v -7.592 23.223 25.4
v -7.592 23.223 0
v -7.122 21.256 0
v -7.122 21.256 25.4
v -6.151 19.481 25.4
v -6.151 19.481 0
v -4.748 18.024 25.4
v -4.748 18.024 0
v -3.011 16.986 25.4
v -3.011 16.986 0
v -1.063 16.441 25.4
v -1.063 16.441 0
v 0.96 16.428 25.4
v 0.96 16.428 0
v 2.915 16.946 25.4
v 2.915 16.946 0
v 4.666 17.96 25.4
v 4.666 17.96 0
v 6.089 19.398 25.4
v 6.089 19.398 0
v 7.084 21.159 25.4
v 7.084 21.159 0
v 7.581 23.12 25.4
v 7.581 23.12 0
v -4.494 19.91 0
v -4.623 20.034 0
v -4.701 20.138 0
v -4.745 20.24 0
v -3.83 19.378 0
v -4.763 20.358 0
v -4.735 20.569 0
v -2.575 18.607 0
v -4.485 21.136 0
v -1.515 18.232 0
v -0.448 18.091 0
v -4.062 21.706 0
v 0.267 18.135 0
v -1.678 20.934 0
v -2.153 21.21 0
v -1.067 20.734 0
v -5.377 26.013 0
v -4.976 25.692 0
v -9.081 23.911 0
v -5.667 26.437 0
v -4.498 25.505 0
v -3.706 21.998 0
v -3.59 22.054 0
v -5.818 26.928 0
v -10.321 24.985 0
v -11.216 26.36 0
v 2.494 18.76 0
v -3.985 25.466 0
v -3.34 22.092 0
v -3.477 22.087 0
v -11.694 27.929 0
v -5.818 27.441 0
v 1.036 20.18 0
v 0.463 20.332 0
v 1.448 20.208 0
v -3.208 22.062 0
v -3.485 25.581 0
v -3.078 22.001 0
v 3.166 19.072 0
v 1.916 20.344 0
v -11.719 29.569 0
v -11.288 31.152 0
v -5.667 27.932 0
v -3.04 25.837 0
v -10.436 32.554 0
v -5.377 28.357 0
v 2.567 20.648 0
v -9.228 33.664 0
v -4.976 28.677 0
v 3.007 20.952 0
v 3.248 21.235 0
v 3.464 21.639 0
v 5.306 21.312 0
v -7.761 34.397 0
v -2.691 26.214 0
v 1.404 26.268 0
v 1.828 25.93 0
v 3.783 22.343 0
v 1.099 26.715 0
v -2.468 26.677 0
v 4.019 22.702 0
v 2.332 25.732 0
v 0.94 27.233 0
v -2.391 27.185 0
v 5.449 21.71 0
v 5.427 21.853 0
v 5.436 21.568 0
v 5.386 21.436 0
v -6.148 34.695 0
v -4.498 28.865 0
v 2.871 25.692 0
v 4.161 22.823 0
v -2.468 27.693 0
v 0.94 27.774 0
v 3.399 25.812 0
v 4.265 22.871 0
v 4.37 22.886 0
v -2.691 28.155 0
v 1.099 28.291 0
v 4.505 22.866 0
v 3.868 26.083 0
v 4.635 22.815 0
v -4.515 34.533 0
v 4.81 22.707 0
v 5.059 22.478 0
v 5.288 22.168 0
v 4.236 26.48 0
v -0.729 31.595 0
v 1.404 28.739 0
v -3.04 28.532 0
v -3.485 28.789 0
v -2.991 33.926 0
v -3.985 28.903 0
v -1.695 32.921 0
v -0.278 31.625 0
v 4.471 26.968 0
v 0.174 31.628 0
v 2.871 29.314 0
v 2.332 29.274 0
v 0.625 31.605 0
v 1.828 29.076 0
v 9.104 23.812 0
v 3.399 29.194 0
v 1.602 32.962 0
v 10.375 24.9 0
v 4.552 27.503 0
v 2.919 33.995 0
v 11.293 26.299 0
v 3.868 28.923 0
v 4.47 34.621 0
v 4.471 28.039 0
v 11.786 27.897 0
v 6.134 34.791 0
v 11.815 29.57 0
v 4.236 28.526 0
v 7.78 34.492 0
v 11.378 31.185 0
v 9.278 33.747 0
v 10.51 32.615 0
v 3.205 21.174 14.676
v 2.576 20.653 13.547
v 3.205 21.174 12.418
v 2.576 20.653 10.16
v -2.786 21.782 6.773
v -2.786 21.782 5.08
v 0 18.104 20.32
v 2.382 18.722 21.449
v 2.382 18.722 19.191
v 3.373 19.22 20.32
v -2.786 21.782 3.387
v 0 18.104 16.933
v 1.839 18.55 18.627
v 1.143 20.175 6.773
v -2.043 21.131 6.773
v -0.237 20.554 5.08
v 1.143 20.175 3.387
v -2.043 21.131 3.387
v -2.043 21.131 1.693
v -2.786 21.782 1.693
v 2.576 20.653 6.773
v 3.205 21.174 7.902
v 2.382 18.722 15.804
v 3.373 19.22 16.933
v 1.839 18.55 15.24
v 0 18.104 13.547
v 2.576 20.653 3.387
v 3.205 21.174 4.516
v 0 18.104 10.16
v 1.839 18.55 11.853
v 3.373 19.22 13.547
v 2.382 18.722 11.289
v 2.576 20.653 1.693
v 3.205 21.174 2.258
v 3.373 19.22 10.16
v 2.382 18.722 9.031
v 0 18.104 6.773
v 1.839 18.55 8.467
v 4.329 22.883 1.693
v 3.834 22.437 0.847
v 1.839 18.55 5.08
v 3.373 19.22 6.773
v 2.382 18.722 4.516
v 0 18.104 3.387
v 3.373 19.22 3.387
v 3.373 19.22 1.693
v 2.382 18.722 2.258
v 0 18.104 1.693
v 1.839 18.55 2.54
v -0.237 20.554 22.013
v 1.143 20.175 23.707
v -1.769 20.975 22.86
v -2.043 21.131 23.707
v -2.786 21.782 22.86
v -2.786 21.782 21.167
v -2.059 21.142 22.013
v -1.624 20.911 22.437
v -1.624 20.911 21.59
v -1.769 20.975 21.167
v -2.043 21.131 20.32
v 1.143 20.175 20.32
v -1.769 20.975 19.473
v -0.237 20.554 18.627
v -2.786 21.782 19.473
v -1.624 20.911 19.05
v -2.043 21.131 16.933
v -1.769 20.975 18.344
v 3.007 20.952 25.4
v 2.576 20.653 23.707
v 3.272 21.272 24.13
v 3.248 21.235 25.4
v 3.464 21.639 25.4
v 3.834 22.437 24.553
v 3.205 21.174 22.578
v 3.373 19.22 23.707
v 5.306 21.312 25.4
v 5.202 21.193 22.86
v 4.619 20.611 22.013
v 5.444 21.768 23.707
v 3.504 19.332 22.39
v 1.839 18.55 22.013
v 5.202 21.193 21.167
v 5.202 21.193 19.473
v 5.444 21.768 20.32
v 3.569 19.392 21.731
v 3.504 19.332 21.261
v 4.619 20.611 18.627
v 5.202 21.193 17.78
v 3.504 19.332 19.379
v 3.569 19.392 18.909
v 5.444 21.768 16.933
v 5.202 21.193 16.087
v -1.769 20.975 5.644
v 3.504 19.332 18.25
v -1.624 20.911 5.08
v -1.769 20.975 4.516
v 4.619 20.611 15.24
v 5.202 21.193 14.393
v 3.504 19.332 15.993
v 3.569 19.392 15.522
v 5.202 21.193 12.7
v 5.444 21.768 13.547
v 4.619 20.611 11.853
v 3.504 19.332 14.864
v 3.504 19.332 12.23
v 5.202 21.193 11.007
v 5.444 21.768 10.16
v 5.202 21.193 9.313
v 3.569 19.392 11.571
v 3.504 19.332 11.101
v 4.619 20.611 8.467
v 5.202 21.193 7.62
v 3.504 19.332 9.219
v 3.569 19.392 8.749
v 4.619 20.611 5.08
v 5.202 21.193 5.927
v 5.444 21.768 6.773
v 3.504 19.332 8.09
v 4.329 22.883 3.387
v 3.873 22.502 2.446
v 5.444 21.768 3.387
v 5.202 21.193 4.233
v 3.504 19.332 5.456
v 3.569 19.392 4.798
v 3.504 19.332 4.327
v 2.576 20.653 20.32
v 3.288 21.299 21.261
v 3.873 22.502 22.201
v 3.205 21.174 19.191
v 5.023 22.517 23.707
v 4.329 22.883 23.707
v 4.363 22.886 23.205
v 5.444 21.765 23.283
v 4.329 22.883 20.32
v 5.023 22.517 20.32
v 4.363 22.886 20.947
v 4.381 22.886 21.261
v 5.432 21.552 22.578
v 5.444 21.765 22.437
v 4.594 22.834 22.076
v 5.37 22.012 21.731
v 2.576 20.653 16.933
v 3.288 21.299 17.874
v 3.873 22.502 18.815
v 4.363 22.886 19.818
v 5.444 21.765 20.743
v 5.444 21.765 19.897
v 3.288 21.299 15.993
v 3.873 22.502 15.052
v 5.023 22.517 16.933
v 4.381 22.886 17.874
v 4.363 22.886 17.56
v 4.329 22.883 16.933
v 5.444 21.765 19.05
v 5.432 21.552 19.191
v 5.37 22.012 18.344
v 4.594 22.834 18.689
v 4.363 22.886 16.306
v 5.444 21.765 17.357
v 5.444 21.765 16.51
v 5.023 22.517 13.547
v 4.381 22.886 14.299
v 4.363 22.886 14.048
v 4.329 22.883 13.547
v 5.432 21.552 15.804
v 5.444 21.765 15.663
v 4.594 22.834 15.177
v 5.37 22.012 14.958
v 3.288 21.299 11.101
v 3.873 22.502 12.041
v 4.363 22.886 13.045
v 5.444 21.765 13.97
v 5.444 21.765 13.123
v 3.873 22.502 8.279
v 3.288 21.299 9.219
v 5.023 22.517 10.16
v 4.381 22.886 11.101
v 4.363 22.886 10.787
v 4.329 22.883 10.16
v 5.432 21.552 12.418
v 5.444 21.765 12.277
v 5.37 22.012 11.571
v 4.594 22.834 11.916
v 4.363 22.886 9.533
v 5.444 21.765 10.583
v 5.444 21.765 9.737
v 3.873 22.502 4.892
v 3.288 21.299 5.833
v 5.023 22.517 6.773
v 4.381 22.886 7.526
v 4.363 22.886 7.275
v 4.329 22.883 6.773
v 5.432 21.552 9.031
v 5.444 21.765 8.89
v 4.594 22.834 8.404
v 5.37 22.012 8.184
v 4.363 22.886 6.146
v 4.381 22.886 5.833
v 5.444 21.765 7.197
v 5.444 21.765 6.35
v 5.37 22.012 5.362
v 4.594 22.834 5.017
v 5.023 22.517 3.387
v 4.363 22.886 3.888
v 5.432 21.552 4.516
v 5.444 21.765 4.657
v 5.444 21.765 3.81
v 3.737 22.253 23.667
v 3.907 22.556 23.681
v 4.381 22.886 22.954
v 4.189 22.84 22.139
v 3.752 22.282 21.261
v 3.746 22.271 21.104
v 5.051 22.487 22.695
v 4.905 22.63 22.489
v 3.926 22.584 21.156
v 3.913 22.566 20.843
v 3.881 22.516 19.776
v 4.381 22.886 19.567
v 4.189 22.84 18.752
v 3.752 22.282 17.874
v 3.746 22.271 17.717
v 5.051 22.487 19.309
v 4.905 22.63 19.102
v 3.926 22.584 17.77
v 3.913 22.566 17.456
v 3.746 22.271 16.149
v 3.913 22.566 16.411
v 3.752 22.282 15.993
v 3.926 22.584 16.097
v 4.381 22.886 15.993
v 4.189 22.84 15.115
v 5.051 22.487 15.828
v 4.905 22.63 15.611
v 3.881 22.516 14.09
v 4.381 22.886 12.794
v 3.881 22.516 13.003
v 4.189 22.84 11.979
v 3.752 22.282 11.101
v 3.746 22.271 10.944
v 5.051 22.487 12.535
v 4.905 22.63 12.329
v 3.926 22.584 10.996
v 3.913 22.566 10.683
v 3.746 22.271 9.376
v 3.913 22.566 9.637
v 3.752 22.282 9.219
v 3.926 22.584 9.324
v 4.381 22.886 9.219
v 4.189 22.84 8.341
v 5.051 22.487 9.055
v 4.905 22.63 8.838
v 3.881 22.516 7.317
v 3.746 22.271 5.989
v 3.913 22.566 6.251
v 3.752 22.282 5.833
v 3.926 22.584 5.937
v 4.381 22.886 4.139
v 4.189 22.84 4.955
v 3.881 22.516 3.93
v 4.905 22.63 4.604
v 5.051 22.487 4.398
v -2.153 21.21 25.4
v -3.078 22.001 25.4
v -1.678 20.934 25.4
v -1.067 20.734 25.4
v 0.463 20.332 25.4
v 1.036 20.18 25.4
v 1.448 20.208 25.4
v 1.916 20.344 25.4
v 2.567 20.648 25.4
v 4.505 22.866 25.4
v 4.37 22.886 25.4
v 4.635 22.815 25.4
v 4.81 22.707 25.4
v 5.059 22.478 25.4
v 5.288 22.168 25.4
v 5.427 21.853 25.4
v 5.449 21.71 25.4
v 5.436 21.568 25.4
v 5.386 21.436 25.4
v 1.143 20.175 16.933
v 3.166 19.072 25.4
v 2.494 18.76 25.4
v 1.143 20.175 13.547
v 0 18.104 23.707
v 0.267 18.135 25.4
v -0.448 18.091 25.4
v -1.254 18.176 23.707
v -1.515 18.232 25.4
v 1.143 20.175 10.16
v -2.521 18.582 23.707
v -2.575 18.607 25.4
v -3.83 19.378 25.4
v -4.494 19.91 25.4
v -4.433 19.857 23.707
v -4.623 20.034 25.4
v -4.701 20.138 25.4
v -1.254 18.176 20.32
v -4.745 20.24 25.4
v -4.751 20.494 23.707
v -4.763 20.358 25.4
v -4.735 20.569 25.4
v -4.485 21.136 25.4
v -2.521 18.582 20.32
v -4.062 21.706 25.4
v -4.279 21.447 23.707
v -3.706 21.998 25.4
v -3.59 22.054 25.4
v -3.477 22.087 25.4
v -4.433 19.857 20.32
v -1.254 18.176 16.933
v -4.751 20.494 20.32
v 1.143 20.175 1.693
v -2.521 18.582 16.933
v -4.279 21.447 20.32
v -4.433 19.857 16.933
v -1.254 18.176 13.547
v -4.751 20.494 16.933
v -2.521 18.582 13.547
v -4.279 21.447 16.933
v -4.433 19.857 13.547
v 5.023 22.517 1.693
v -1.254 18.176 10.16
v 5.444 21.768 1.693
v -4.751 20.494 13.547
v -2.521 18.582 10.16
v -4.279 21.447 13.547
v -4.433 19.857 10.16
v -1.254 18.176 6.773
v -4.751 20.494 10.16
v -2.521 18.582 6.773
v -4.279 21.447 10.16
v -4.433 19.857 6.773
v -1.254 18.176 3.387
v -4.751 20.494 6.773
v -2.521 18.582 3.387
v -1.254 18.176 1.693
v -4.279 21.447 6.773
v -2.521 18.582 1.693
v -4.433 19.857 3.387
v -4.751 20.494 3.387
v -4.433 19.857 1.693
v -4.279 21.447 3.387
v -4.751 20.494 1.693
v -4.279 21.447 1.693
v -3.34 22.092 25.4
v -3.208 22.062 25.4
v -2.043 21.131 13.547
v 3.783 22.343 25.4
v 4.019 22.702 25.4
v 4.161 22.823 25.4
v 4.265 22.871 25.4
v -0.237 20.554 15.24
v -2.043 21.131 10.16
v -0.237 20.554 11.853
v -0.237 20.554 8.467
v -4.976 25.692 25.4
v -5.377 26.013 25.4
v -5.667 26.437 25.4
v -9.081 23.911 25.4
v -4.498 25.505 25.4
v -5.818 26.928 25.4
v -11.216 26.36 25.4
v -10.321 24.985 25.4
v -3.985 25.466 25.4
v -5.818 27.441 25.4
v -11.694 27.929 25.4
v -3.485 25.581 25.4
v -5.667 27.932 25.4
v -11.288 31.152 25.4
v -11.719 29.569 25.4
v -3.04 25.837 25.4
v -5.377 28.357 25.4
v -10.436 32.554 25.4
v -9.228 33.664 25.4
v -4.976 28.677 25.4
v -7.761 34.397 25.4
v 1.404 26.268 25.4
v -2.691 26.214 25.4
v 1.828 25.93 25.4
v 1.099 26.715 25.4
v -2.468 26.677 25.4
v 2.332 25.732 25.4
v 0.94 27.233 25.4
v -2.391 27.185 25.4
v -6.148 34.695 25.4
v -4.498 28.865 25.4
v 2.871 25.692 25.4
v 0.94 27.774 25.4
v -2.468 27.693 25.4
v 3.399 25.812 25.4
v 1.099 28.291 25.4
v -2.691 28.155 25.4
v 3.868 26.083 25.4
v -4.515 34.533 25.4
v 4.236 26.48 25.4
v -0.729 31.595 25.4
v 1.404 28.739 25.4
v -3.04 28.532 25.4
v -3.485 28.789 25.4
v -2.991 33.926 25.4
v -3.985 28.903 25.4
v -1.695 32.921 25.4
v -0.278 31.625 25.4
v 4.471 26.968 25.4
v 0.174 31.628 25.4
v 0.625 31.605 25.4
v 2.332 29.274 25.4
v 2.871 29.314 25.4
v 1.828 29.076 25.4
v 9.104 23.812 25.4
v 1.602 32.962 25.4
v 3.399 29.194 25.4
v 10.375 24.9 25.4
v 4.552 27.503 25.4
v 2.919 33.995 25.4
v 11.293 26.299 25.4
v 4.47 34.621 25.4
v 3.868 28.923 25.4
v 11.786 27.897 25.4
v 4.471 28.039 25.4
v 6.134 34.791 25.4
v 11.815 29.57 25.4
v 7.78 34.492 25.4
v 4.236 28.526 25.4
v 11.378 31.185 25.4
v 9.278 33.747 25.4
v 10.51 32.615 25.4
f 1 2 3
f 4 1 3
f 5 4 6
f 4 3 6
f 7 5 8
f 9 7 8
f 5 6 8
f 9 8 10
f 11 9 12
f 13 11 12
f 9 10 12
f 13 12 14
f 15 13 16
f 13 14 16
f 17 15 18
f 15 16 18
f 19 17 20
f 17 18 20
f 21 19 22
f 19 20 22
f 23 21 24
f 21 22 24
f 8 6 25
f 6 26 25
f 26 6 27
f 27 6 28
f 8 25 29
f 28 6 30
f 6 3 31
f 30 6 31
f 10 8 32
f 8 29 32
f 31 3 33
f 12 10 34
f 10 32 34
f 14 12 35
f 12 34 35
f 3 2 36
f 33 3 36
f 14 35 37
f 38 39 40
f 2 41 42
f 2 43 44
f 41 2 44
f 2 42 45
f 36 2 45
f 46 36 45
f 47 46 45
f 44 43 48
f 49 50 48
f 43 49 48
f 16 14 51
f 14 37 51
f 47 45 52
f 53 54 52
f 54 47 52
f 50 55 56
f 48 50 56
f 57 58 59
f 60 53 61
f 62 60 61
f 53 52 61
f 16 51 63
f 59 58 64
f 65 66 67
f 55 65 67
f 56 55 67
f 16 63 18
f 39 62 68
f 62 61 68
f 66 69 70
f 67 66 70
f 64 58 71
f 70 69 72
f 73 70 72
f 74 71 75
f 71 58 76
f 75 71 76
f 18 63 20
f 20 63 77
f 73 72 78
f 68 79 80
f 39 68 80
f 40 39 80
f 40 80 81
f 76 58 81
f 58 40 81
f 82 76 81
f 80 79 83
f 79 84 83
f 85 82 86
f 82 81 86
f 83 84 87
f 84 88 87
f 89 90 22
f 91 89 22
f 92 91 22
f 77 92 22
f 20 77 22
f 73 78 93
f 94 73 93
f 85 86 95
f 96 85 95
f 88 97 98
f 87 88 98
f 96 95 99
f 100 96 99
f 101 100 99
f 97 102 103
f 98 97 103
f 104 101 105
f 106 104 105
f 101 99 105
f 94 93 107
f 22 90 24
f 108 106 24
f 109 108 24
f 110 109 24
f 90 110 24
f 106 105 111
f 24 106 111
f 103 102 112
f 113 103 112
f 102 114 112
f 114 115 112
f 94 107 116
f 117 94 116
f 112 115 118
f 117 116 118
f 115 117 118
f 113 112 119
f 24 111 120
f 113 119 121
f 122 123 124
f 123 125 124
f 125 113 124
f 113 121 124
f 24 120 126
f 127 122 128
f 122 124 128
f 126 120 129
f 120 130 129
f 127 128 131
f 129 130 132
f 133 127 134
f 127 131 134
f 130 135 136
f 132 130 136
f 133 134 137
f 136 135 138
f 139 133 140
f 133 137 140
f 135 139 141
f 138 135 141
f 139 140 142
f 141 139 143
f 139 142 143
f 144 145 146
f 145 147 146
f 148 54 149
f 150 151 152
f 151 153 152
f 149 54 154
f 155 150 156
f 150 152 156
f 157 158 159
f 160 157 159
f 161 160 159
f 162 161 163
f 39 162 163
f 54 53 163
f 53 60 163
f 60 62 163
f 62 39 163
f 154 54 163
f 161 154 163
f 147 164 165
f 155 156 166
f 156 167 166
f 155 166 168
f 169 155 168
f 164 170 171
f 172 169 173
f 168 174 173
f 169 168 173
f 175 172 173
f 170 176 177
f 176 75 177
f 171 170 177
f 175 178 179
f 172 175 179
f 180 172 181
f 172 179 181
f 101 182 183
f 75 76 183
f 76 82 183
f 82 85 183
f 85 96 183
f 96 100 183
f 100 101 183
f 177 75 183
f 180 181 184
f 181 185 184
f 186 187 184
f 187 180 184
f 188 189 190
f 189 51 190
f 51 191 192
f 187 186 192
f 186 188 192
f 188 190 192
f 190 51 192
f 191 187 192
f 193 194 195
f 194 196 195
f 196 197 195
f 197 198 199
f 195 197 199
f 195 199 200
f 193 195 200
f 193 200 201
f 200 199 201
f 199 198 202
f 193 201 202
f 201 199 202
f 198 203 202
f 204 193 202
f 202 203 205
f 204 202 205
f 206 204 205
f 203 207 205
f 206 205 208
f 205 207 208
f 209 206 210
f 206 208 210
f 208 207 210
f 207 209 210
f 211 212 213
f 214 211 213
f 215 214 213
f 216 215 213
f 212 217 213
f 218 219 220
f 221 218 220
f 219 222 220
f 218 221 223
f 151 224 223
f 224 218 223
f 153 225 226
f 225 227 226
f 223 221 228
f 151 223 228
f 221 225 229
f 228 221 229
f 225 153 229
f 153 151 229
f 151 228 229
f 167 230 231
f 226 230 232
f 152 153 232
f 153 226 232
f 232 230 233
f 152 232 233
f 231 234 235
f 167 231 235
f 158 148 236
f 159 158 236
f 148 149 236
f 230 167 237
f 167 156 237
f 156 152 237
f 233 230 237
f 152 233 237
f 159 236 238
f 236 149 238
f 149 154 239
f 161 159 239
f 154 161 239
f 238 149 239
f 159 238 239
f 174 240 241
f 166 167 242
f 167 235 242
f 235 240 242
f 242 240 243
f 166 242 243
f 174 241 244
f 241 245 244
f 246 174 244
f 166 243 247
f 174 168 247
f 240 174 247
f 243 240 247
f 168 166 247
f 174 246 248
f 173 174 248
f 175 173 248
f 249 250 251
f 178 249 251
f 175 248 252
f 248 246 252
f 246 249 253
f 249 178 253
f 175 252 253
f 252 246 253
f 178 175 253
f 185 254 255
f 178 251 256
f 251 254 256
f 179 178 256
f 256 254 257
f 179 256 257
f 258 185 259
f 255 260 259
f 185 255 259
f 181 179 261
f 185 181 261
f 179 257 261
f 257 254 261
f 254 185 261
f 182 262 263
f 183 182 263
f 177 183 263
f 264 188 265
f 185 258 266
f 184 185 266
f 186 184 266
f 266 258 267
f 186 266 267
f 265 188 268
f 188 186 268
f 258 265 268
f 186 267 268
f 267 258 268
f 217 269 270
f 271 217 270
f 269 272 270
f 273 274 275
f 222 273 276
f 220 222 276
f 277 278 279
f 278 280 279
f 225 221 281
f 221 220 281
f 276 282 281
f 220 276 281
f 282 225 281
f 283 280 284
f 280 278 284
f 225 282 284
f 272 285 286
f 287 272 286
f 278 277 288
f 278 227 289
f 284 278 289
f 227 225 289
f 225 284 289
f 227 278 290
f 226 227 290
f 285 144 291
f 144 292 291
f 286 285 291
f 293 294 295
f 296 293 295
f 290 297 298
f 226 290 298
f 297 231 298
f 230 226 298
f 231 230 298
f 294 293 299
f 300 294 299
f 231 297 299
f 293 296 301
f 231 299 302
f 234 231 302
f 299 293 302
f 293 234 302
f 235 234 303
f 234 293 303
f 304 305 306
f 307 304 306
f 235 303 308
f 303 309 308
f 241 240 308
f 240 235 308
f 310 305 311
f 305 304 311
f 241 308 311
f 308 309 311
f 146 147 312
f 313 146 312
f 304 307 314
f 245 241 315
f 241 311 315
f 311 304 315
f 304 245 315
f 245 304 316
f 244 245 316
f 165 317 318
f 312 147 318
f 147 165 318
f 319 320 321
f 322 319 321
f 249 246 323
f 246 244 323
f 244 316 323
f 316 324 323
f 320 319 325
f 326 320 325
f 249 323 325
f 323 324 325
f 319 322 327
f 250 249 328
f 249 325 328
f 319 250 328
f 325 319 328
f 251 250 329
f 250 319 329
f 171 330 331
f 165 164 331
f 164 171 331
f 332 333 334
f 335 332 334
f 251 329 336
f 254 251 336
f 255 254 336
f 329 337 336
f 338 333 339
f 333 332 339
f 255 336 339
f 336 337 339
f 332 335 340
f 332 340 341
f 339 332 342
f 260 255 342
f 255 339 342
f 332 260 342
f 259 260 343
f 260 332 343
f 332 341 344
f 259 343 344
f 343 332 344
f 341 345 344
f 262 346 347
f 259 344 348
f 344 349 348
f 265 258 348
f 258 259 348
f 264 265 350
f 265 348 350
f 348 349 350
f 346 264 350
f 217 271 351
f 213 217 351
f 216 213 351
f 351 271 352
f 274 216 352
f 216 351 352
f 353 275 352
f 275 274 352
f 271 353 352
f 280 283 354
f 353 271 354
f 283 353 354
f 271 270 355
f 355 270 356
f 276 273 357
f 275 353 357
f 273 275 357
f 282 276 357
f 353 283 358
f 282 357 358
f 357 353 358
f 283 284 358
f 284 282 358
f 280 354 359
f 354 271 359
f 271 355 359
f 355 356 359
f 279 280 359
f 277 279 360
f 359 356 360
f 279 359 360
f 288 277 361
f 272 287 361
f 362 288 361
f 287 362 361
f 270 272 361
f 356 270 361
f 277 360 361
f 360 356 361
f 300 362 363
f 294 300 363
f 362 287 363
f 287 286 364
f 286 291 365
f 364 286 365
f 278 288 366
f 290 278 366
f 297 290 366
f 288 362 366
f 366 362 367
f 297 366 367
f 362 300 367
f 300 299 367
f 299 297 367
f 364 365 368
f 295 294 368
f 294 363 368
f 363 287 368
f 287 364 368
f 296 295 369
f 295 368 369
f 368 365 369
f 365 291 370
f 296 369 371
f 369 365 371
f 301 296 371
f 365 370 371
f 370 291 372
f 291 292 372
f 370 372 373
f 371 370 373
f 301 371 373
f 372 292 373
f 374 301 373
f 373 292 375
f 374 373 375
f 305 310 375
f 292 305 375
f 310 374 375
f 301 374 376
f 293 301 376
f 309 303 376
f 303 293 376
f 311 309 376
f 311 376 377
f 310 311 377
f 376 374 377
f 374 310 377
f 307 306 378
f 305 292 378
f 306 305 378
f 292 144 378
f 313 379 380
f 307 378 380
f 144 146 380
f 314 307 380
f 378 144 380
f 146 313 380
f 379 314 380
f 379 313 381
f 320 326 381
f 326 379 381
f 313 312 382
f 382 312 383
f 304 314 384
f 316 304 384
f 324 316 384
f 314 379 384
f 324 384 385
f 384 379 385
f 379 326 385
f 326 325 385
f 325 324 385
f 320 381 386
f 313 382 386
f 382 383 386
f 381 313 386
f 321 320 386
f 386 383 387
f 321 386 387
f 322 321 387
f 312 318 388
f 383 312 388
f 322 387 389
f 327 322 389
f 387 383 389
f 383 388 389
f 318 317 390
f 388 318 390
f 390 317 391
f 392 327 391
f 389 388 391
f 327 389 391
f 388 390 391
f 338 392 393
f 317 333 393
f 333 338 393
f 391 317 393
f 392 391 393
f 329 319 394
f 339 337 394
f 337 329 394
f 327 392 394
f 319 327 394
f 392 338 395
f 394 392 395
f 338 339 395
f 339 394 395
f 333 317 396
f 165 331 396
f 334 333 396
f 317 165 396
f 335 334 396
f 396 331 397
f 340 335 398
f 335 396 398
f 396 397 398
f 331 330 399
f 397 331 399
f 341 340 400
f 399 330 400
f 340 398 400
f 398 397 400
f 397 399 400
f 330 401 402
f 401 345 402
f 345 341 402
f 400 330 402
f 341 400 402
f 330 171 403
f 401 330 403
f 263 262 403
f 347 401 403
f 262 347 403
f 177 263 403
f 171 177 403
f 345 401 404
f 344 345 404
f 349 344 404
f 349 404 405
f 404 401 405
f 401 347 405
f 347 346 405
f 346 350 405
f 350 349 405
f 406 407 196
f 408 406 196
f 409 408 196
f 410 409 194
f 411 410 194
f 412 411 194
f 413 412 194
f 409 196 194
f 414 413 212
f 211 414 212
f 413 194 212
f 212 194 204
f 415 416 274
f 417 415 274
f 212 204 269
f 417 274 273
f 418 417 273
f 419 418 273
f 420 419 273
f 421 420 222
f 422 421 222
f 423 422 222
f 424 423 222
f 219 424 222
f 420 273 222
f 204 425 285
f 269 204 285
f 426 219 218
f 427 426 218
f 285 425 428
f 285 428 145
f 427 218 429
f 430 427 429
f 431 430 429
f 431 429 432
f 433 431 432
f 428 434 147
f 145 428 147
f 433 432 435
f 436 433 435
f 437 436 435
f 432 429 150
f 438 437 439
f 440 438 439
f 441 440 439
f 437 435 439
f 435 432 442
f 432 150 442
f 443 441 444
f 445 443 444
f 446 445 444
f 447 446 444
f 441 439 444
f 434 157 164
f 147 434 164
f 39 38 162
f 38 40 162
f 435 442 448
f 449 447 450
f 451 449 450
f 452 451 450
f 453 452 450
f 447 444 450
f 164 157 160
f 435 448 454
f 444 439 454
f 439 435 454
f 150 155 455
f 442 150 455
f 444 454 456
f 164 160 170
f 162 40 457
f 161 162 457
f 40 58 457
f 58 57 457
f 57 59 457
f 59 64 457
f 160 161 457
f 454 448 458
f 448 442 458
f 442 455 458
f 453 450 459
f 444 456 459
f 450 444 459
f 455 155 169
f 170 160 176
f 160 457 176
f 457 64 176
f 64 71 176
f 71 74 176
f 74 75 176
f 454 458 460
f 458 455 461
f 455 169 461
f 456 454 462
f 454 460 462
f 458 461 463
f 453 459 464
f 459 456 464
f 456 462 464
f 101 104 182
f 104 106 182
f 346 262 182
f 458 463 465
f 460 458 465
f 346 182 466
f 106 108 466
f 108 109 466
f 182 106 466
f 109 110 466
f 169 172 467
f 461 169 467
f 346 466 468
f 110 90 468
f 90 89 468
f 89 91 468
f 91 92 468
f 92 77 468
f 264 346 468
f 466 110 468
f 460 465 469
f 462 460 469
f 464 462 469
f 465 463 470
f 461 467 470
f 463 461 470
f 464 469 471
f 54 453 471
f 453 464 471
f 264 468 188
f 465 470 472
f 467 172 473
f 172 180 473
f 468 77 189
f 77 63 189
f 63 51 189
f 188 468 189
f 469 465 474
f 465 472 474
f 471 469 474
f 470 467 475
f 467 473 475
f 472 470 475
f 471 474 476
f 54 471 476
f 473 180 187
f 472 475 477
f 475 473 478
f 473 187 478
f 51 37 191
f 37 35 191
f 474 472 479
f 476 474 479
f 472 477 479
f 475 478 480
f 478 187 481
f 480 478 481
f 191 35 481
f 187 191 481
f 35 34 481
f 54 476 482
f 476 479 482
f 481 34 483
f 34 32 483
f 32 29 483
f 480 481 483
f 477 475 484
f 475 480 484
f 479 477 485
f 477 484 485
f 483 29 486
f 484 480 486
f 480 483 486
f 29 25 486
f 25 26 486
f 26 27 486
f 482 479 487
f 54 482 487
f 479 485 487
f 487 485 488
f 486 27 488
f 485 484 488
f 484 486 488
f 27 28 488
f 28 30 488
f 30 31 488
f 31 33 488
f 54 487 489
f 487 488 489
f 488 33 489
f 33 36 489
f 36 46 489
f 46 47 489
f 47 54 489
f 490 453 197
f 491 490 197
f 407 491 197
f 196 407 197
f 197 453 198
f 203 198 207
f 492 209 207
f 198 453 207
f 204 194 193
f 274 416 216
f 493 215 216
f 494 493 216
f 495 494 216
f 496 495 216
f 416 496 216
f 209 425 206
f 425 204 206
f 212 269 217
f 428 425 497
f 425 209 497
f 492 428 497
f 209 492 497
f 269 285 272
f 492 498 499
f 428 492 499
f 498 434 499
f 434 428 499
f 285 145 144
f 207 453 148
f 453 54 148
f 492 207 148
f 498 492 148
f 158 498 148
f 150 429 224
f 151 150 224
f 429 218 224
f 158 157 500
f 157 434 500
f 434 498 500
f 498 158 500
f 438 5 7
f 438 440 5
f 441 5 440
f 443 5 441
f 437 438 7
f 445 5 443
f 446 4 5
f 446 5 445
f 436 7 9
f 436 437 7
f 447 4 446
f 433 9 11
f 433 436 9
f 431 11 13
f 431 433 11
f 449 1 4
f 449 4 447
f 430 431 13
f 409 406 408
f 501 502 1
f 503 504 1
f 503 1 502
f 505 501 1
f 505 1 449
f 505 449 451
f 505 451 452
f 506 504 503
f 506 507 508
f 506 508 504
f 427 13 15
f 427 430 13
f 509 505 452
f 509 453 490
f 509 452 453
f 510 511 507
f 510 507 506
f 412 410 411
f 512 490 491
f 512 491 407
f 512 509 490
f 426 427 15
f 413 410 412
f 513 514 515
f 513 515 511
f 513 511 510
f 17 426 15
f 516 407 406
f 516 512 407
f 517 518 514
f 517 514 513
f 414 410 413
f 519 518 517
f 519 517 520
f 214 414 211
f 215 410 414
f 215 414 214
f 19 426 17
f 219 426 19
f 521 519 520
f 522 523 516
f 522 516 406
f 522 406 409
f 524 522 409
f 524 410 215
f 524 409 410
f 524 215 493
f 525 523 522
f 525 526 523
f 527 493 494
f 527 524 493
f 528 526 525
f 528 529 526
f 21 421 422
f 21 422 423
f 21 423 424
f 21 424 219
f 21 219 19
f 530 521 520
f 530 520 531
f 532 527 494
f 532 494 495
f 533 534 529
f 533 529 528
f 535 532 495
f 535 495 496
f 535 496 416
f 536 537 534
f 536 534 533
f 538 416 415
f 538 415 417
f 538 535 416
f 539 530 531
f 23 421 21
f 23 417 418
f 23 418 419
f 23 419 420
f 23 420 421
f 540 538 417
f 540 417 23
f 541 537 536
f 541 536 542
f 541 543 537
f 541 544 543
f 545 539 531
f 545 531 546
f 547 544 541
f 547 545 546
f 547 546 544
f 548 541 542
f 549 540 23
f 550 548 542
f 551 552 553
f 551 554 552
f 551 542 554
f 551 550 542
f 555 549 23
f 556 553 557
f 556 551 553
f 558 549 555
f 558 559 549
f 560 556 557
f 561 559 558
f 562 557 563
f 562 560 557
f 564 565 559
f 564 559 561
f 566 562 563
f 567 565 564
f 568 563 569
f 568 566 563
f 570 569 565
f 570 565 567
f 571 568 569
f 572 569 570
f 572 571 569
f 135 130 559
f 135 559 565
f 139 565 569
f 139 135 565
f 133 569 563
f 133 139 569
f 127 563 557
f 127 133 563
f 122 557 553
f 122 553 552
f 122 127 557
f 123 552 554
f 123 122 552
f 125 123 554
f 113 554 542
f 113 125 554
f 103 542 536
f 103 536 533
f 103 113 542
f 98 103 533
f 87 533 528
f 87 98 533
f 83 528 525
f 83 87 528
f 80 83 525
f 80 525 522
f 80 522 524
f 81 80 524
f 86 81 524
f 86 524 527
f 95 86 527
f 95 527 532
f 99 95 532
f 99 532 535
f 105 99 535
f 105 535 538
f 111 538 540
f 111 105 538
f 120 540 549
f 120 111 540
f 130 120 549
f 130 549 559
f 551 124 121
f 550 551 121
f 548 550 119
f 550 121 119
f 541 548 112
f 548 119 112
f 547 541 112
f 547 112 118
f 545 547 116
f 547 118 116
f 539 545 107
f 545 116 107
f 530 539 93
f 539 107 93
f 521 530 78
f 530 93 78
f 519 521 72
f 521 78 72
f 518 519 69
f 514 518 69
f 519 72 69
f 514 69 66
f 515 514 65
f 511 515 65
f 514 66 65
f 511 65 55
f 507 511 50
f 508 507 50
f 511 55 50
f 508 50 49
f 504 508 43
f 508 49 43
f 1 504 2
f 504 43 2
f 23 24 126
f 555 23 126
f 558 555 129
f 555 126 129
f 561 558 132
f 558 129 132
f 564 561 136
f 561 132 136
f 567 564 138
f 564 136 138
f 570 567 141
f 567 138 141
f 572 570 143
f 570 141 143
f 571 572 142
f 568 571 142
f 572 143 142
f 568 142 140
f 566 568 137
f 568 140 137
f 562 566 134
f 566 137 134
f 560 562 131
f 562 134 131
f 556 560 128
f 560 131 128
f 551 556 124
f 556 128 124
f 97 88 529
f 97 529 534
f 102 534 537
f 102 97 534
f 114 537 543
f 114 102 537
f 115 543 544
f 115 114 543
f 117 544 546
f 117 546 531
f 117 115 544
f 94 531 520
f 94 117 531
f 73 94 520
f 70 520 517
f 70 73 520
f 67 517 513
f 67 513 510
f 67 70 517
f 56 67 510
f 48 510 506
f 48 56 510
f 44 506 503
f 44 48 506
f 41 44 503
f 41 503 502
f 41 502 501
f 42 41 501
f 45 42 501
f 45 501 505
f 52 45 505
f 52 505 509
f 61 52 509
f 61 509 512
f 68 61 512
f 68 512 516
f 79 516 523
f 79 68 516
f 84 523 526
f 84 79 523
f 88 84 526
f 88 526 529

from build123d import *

# Parameters (mm, degrees)
F0_R     = 1.7231011996
F0_R_2   = 1.8163065436
F1_DEPTH = 25.4


with BuildPart() as f1:
    # F0 (on Top) → F1 (new body)
    with BuildSketch(Plane.XY):
        with BuildLine():
            ThreePointArc((-0.7285891613, 31.5953561161), (-10.4357050745, 32.5538624056), (-7.5921216037, 23.2232211252))
            ThreePointArc((-7.5921216037, 23.2232211252), (-0.0519449948, 16.3671646248), (7.5808630386, 23.1199429829))
            ThreePointArc((7.5808630386, 23.1199429829), (10.5097792981, 32.6145889512), (0.6251085936, 31.6045703473))
            ThreePointArc((0.6251085936, 31.6045703473), (-0.0519449948, 31.6300380994), (-0.7285891613, 31.5953561161))
        make_face()
        with Locations((-4.1142129339, 27.1846149117)):
            Circle(F0_R, mode=Mode.SUBTRACT)
        with BuildLine():
            add(Edge.make_bspline(
                [(-3.4770104103, 22.0869928598), (-2.9885996802, 22.1732919096), (-2.1688121082, 20.760016981), (0.0304388848, 20.6264558904), (1.0858387052, 19.9567189767), (2.6631910158, 20.638569289), (3.4426706664, 21.2607817308), (4.1101758755, 23.665486052), (5.90869138, 21.629443832), (4.6717701033, 20.8622664078), (3.4937069943, 19.0167516314), (1.9212729778, 18.6056919538), (-0.0172091849, 17.8958908597), (-2.5437022761, 18.3544392475), (-4.4132706365, 19.8105304724), (-5.0436348372, 20.4222270913), (-4.0084447966, 21.9930918054), (-3.4770104103, 22.0869928598)],
                knots=[0, 0, 0, 0, 0.0679593618, 0.1437014321, 0.2000898538, 0.2637347273, 0.3186819265, 0.3866413062, 0.4516556765, 0.507144261, 0.5829361235, 0.6477840128, 0.7209498274, 0.8038835304, 0.8823562479, 0.9260541599, 1, 1, 1, 1], degree=3))
        make_face(mode=Mode.SUBTRACT)
        with Locations((2.7357134968, 27.5032147765)):
            Circle(F0_R_2, mode=Mode.SUBTRACT)
    extrude(amount=F1_DEPTH)


solid = f1.part
